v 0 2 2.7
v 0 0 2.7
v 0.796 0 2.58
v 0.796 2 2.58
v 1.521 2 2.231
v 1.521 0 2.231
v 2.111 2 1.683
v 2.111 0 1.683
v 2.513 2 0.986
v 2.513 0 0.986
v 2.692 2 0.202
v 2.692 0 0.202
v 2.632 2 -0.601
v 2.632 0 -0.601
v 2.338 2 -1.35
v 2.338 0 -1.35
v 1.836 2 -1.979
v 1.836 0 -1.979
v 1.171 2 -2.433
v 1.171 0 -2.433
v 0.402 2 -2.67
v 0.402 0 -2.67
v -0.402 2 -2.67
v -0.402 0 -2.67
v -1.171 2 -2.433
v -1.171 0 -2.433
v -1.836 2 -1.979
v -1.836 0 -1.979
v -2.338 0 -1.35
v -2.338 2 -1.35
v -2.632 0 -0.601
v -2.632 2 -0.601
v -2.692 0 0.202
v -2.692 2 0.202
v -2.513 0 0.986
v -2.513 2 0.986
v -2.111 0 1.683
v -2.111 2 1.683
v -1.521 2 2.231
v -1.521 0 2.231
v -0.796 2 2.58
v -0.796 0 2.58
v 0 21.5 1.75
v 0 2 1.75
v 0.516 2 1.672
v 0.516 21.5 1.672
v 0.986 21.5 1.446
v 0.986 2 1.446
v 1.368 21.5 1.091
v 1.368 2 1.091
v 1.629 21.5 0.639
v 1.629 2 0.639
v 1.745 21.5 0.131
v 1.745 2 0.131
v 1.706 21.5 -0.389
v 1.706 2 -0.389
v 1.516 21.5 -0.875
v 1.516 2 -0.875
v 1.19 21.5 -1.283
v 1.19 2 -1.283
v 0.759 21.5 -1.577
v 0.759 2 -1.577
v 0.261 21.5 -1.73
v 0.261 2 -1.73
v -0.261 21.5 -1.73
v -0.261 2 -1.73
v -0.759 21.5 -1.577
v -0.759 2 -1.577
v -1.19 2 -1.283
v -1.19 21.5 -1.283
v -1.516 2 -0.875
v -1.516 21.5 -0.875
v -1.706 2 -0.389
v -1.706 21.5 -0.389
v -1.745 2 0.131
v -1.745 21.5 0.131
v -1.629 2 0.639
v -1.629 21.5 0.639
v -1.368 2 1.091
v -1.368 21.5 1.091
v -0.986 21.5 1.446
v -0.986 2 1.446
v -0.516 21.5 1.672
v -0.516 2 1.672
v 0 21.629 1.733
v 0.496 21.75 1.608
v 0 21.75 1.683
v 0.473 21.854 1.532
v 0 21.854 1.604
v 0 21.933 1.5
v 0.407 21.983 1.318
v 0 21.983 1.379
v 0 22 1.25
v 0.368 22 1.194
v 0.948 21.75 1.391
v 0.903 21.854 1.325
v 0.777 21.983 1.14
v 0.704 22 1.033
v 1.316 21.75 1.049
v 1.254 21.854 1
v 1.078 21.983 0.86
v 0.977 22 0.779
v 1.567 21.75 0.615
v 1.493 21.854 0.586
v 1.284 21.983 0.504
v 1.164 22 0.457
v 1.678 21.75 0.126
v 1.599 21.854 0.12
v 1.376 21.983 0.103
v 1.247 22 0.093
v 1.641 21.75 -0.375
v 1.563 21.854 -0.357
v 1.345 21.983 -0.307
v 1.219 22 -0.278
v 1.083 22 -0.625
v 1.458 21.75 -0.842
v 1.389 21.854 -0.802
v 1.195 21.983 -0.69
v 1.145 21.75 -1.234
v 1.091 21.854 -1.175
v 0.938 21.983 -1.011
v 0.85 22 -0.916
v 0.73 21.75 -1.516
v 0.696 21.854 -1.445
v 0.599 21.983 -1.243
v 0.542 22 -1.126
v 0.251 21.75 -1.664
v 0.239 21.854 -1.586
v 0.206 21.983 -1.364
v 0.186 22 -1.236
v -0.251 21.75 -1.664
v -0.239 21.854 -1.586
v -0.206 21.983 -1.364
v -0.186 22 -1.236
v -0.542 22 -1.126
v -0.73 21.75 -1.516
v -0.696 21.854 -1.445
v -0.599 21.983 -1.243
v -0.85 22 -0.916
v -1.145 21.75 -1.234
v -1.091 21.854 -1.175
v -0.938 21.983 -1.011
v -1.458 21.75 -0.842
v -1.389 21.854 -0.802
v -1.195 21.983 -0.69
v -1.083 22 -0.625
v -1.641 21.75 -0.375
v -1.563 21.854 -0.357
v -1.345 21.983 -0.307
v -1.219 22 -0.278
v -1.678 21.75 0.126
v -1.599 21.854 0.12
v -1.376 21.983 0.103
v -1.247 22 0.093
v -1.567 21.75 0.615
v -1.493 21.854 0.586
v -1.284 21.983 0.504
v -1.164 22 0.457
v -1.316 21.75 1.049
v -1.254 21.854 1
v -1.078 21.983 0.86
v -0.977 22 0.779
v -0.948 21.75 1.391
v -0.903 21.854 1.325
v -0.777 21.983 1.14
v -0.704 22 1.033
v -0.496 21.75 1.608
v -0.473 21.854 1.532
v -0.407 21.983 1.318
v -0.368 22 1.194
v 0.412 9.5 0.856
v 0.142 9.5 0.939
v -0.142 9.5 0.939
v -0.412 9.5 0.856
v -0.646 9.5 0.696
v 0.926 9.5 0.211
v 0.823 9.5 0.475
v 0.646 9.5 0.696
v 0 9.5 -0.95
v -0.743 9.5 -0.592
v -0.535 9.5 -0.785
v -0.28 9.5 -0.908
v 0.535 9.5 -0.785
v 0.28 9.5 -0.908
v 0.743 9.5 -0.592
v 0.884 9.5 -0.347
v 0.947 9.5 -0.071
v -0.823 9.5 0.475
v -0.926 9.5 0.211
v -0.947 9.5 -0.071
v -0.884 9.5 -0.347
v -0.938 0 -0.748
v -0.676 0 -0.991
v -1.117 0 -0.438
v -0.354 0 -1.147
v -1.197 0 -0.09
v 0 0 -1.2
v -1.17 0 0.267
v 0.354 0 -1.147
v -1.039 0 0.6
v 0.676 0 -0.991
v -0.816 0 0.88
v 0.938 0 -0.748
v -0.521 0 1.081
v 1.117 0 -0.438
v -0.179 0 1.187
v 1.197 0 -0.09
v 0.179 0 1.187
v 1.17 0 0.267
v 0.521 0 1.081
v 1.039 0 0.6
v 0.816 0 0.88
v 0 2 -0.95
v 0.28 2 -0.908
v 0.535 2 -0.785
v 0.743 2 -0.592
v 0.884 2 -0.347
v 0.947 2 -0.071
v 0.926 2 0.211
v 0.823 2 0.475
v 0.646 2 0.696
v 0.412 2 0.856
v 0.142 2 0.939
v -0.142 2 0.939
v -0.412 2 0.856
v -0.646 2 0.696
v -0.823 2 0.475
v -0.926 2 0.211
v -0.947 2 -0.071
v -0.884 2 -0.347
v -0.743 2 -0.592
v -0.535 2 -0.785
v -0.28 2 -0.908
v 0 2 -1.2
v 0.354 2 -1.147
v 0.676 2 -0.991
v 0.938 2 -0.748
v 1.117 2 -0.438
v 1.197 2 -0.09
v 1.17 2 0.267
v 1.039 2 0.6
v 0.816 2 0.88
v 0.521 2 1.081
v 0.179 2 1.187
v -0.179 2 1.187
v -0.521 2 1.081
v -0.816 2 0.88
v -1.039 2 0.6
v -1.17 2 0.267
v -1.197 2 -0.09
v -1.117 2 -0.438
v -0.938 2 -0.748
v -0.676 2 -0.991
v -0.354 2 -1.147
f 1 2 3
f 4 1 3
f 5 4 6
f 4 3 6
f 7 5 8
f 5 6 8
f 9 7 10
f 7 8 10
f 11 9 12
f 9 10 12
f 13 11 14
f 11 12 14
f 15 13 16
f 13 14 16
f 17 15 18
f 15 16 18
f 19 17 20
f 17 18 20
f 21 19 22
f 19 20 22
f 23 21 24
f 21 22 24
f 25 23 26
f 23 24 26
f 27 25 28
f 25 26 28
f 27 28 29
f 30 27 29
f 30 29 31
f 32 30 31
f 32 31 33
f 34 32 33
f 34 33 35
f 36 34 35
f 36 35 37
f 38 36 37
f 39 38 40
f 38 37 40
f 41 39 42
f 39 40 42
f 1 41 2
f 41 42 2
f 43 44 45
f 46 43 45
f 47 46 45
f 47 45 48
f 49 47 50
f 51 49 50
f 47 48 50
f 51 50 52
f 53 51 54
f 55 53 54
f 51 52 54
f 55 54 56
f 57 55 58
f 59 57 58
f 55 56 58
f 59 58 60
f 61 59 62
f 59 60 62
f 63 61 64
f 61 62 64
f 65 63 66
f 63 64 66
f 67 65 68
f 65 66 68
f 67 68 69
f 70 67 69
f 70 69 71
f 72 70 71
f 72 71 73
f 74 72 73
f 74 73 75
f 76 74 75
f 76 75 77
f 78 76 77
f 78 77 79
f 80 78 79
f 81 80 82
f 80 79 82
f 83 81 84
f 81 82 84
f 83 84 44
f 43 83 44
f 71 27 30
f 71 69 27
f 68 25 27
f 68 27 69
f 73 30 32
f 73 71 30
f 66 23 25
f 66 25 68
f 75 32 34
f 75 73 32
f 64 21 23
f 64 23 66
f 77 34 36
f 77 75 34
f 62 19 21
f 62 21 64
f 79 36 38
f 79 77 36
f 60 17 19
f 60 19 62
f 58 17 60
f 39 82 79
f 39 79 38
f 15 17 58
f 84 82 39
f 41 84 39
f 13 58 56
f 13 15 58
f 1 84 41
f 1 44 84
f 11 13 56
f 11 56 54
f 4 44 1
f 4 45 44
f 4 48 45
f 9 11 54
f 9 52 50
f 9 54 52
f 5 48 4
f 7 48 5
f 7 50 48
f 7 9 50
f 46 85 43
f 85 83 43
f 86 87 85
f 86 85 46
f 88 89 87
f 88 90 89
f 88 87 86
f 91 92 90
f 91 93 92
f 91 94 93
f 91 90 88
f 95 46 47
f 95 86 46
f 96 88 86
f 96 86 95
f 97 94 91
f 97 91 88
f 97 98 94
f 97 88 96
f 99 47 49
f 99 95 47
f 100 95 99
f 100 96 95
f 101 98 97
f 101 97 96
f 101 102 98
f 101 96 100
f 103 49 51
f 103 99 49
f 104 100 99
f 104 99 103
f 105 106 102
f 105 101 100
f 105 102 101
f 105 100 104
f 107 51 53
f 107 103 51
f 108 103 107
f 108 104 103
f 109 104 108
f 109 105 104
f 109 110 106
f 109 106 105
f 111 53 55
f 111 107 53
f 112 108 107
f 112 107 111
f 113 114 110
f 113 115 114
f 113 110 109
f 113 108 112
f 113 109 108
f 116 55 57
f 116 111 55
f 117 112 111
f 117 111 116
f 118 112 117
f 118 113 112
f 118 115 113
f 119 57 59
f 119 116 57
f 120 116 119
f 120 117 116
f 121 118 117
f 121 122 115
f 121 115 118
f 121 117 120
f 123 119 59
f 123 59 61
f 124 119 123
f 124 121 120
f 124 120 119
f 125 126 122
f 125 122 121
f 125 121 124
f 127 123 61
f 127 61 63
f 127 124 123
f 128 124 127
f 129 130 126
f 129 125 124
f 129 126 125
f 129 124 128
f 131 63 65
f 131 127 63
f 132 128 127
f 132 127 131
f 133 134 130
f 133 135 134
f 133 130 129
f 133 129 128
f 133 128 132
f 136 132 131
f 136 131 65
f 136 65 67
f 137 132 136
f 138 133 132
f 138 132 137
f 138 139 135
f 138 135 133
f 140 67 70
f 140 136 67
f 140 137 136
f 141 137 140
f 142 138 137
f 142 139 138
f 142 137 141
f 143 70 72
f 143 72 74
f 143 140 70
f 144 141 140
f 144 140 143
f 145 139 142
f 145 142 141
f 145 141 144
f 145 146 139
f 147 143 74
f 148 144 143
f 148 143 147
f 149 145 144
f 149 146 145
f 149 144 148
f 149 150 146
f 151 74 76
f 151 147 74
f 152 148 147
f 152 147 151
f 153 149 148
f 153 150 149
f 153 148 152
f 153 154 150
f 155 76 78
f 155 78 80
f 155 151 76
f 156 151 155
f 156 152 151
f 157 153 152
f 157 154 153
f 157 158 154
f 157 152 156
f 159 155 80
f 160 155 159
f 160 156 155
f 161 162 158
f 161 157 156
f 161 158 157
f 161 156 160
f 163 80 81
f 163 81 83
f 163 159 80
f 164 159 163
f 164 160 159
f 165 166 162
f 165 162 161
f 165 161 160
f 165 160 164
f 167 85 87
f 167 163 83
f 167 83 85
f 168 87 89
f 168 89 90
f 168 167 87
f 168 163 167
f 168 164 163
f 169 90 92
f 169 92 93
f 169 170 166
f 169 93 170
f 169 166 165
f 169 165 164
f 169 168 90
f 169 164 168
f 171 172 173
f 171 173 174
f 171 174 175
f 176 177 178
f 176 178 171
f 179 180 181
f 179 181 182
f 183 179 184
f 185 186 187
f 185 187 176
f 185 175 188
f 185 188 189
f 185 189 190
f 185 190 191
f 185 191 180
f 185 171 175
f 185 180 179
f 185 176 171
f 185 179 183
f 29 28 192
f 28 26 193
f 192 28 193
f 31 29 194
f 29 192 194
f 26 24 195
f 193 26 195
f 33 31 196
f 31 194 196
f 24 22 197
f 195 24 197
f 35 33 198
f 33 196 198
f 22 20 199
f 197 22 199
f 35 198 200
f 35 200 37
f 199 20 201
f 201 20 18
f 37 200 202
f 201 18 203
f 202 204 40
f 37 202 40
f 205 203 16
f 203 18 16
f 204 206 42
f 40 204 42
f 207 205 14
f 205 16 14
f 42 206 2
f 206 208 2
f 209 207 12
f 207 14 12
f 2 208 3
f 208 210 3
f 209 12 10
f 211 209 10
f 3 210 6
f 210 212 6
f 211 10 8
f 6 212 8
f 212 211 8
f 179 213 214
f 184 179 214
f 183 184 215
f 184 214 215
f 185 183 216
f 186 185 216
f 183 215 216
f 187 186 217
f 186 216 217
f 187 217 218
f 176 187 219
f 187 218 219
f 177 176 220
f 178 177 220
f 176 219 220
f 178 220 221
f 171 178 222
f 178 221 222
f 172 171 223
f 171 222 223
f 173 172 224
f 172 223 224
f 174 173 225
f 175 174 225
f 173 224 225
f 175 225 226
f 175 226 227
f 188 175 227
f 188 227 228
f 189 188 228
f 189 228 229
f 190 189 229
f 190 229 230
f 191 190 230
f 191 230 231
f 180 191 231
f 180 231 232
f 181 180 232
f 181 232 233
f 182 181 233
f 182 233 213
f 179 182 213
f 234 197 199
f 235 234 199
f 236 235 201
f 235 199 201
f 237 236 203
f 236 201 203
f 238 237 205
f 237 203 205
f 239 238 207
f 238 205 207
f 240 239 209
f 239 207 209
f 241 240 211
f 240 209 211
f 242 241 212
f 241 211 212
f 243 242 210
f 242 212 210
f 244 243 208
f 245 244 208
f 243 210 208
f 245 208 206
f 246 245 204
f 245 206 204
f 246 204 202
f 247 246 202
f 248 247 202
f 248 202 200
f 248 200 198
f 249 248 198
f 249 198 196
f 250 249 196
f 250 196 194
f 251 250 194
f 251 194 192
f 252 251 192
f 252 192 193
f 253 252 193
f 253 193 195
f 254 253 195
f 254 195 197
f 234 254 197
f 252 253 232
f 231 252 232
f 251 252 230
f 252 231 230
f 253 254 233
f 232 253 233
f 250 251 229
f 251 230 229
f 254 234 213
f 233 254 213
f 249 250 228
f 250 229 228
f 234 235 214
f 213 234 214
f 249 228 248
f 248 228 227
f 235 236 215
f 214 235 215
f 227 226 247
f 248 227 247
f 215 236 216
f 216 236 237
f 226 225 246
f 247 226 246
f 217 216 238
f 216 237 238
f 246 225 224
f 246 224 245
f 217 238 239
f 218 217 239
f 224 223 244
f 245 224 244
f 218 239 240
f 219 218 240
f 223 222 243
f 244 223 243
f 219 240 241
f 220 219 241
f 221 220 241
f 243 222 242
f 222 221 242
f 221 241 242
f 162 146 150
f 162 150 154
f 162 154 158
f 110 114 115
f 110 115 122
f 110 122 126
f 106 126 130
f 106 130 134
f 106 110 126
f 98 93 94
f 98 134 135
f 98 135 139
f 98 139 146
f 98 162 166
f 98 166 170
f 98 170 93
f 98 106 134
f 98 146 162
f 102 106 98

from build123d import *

# Parameters (mm, degrees)
SKETCH1_R           = 2.7
BOSS_EXTRUDE1_DEPTH = 2
SKETCH3_R           = 0.95
CUT_EXTRUDE2_DEPTH  = 9.5
SKETCH7_R           = 1.2
CUT_EXTRUDE4_DEPTH  = 2.8
SKETCH2_R           = 1.75
BOSS_EXTRUDE2_DEPTH = 20
FILLET2_R           = 0.5
SKETCH8_R           = 0.95
CUT_EXTRUDE5_DEPTH  = 9.5


with BuildPart() as part:
    # Sketch1 → Boss-Extrude1 (new body)
    with BuildSketch(Plane(origin=(0, 0, 0), x_dir=(1, 0, 0), z_dir=(0, 1, 0))):
        with Locations(Location((0, 0, 0), (0, 0, 270))):
            Circle(SKETCH1_R)
    extrude(amount=BOSS_EXTRUDE1_DEPTH)

    # Sketch3 → Cut-Extrude2 (cut)
    with BuildSketch(Plane.XZ):
        with Locations(Location((0, 0, 0), (0, 0, 270))):
            Circle(SKETCH3_R)
    extrude(amount=-CUT_EXTRUDE2_DEPTH, mode=Mode.SUBTRACT)

    # Sketch7 → Cut-Extrude4 (cut)
    with BuildSketch(Plane.XZ):
        with Locations(Location((0, 0, 0), (0, 0, 270))):
            Circle(SKETCH7_R)
    extrude(amount=-CUT_EXTRUDE4_DEPTH, mode=Mode.SUBTRACT)

    # Sketch2 → Boss-Extrude2 (add)
    with BuildSketch(Plane(origin=(0, 2, 0), x_dir=(1, 0, 0), z_dir=(0, 1, 0))):
        with Locations(Location((0, 0, 0), (0, 0, 270))):
            Circle(SKETCH2_R)
    extrude(amount=BOSS_EXTRUDE2_DEPTH)

    # Fillet2
    fillet2_edges = [part.edges().sort_by_distance(p)[0] for p in [
        (0, 22, -1.75),
    ]]
    fillet(fillet2_edges, radius=FILLET2_R)

    # Sketch8 → Cut-Extrude5 (cut)
    with BuildSketch(Plane.XZ):
        with Locations(Location((0, 0, 0), (0, 0, 270))):
            Circle(SKETCH8_R)
    extrude(amount=-CUT_EXTRUDE5_DEPTH, mode=Mode.SUBTRACT)


solid = part.part
